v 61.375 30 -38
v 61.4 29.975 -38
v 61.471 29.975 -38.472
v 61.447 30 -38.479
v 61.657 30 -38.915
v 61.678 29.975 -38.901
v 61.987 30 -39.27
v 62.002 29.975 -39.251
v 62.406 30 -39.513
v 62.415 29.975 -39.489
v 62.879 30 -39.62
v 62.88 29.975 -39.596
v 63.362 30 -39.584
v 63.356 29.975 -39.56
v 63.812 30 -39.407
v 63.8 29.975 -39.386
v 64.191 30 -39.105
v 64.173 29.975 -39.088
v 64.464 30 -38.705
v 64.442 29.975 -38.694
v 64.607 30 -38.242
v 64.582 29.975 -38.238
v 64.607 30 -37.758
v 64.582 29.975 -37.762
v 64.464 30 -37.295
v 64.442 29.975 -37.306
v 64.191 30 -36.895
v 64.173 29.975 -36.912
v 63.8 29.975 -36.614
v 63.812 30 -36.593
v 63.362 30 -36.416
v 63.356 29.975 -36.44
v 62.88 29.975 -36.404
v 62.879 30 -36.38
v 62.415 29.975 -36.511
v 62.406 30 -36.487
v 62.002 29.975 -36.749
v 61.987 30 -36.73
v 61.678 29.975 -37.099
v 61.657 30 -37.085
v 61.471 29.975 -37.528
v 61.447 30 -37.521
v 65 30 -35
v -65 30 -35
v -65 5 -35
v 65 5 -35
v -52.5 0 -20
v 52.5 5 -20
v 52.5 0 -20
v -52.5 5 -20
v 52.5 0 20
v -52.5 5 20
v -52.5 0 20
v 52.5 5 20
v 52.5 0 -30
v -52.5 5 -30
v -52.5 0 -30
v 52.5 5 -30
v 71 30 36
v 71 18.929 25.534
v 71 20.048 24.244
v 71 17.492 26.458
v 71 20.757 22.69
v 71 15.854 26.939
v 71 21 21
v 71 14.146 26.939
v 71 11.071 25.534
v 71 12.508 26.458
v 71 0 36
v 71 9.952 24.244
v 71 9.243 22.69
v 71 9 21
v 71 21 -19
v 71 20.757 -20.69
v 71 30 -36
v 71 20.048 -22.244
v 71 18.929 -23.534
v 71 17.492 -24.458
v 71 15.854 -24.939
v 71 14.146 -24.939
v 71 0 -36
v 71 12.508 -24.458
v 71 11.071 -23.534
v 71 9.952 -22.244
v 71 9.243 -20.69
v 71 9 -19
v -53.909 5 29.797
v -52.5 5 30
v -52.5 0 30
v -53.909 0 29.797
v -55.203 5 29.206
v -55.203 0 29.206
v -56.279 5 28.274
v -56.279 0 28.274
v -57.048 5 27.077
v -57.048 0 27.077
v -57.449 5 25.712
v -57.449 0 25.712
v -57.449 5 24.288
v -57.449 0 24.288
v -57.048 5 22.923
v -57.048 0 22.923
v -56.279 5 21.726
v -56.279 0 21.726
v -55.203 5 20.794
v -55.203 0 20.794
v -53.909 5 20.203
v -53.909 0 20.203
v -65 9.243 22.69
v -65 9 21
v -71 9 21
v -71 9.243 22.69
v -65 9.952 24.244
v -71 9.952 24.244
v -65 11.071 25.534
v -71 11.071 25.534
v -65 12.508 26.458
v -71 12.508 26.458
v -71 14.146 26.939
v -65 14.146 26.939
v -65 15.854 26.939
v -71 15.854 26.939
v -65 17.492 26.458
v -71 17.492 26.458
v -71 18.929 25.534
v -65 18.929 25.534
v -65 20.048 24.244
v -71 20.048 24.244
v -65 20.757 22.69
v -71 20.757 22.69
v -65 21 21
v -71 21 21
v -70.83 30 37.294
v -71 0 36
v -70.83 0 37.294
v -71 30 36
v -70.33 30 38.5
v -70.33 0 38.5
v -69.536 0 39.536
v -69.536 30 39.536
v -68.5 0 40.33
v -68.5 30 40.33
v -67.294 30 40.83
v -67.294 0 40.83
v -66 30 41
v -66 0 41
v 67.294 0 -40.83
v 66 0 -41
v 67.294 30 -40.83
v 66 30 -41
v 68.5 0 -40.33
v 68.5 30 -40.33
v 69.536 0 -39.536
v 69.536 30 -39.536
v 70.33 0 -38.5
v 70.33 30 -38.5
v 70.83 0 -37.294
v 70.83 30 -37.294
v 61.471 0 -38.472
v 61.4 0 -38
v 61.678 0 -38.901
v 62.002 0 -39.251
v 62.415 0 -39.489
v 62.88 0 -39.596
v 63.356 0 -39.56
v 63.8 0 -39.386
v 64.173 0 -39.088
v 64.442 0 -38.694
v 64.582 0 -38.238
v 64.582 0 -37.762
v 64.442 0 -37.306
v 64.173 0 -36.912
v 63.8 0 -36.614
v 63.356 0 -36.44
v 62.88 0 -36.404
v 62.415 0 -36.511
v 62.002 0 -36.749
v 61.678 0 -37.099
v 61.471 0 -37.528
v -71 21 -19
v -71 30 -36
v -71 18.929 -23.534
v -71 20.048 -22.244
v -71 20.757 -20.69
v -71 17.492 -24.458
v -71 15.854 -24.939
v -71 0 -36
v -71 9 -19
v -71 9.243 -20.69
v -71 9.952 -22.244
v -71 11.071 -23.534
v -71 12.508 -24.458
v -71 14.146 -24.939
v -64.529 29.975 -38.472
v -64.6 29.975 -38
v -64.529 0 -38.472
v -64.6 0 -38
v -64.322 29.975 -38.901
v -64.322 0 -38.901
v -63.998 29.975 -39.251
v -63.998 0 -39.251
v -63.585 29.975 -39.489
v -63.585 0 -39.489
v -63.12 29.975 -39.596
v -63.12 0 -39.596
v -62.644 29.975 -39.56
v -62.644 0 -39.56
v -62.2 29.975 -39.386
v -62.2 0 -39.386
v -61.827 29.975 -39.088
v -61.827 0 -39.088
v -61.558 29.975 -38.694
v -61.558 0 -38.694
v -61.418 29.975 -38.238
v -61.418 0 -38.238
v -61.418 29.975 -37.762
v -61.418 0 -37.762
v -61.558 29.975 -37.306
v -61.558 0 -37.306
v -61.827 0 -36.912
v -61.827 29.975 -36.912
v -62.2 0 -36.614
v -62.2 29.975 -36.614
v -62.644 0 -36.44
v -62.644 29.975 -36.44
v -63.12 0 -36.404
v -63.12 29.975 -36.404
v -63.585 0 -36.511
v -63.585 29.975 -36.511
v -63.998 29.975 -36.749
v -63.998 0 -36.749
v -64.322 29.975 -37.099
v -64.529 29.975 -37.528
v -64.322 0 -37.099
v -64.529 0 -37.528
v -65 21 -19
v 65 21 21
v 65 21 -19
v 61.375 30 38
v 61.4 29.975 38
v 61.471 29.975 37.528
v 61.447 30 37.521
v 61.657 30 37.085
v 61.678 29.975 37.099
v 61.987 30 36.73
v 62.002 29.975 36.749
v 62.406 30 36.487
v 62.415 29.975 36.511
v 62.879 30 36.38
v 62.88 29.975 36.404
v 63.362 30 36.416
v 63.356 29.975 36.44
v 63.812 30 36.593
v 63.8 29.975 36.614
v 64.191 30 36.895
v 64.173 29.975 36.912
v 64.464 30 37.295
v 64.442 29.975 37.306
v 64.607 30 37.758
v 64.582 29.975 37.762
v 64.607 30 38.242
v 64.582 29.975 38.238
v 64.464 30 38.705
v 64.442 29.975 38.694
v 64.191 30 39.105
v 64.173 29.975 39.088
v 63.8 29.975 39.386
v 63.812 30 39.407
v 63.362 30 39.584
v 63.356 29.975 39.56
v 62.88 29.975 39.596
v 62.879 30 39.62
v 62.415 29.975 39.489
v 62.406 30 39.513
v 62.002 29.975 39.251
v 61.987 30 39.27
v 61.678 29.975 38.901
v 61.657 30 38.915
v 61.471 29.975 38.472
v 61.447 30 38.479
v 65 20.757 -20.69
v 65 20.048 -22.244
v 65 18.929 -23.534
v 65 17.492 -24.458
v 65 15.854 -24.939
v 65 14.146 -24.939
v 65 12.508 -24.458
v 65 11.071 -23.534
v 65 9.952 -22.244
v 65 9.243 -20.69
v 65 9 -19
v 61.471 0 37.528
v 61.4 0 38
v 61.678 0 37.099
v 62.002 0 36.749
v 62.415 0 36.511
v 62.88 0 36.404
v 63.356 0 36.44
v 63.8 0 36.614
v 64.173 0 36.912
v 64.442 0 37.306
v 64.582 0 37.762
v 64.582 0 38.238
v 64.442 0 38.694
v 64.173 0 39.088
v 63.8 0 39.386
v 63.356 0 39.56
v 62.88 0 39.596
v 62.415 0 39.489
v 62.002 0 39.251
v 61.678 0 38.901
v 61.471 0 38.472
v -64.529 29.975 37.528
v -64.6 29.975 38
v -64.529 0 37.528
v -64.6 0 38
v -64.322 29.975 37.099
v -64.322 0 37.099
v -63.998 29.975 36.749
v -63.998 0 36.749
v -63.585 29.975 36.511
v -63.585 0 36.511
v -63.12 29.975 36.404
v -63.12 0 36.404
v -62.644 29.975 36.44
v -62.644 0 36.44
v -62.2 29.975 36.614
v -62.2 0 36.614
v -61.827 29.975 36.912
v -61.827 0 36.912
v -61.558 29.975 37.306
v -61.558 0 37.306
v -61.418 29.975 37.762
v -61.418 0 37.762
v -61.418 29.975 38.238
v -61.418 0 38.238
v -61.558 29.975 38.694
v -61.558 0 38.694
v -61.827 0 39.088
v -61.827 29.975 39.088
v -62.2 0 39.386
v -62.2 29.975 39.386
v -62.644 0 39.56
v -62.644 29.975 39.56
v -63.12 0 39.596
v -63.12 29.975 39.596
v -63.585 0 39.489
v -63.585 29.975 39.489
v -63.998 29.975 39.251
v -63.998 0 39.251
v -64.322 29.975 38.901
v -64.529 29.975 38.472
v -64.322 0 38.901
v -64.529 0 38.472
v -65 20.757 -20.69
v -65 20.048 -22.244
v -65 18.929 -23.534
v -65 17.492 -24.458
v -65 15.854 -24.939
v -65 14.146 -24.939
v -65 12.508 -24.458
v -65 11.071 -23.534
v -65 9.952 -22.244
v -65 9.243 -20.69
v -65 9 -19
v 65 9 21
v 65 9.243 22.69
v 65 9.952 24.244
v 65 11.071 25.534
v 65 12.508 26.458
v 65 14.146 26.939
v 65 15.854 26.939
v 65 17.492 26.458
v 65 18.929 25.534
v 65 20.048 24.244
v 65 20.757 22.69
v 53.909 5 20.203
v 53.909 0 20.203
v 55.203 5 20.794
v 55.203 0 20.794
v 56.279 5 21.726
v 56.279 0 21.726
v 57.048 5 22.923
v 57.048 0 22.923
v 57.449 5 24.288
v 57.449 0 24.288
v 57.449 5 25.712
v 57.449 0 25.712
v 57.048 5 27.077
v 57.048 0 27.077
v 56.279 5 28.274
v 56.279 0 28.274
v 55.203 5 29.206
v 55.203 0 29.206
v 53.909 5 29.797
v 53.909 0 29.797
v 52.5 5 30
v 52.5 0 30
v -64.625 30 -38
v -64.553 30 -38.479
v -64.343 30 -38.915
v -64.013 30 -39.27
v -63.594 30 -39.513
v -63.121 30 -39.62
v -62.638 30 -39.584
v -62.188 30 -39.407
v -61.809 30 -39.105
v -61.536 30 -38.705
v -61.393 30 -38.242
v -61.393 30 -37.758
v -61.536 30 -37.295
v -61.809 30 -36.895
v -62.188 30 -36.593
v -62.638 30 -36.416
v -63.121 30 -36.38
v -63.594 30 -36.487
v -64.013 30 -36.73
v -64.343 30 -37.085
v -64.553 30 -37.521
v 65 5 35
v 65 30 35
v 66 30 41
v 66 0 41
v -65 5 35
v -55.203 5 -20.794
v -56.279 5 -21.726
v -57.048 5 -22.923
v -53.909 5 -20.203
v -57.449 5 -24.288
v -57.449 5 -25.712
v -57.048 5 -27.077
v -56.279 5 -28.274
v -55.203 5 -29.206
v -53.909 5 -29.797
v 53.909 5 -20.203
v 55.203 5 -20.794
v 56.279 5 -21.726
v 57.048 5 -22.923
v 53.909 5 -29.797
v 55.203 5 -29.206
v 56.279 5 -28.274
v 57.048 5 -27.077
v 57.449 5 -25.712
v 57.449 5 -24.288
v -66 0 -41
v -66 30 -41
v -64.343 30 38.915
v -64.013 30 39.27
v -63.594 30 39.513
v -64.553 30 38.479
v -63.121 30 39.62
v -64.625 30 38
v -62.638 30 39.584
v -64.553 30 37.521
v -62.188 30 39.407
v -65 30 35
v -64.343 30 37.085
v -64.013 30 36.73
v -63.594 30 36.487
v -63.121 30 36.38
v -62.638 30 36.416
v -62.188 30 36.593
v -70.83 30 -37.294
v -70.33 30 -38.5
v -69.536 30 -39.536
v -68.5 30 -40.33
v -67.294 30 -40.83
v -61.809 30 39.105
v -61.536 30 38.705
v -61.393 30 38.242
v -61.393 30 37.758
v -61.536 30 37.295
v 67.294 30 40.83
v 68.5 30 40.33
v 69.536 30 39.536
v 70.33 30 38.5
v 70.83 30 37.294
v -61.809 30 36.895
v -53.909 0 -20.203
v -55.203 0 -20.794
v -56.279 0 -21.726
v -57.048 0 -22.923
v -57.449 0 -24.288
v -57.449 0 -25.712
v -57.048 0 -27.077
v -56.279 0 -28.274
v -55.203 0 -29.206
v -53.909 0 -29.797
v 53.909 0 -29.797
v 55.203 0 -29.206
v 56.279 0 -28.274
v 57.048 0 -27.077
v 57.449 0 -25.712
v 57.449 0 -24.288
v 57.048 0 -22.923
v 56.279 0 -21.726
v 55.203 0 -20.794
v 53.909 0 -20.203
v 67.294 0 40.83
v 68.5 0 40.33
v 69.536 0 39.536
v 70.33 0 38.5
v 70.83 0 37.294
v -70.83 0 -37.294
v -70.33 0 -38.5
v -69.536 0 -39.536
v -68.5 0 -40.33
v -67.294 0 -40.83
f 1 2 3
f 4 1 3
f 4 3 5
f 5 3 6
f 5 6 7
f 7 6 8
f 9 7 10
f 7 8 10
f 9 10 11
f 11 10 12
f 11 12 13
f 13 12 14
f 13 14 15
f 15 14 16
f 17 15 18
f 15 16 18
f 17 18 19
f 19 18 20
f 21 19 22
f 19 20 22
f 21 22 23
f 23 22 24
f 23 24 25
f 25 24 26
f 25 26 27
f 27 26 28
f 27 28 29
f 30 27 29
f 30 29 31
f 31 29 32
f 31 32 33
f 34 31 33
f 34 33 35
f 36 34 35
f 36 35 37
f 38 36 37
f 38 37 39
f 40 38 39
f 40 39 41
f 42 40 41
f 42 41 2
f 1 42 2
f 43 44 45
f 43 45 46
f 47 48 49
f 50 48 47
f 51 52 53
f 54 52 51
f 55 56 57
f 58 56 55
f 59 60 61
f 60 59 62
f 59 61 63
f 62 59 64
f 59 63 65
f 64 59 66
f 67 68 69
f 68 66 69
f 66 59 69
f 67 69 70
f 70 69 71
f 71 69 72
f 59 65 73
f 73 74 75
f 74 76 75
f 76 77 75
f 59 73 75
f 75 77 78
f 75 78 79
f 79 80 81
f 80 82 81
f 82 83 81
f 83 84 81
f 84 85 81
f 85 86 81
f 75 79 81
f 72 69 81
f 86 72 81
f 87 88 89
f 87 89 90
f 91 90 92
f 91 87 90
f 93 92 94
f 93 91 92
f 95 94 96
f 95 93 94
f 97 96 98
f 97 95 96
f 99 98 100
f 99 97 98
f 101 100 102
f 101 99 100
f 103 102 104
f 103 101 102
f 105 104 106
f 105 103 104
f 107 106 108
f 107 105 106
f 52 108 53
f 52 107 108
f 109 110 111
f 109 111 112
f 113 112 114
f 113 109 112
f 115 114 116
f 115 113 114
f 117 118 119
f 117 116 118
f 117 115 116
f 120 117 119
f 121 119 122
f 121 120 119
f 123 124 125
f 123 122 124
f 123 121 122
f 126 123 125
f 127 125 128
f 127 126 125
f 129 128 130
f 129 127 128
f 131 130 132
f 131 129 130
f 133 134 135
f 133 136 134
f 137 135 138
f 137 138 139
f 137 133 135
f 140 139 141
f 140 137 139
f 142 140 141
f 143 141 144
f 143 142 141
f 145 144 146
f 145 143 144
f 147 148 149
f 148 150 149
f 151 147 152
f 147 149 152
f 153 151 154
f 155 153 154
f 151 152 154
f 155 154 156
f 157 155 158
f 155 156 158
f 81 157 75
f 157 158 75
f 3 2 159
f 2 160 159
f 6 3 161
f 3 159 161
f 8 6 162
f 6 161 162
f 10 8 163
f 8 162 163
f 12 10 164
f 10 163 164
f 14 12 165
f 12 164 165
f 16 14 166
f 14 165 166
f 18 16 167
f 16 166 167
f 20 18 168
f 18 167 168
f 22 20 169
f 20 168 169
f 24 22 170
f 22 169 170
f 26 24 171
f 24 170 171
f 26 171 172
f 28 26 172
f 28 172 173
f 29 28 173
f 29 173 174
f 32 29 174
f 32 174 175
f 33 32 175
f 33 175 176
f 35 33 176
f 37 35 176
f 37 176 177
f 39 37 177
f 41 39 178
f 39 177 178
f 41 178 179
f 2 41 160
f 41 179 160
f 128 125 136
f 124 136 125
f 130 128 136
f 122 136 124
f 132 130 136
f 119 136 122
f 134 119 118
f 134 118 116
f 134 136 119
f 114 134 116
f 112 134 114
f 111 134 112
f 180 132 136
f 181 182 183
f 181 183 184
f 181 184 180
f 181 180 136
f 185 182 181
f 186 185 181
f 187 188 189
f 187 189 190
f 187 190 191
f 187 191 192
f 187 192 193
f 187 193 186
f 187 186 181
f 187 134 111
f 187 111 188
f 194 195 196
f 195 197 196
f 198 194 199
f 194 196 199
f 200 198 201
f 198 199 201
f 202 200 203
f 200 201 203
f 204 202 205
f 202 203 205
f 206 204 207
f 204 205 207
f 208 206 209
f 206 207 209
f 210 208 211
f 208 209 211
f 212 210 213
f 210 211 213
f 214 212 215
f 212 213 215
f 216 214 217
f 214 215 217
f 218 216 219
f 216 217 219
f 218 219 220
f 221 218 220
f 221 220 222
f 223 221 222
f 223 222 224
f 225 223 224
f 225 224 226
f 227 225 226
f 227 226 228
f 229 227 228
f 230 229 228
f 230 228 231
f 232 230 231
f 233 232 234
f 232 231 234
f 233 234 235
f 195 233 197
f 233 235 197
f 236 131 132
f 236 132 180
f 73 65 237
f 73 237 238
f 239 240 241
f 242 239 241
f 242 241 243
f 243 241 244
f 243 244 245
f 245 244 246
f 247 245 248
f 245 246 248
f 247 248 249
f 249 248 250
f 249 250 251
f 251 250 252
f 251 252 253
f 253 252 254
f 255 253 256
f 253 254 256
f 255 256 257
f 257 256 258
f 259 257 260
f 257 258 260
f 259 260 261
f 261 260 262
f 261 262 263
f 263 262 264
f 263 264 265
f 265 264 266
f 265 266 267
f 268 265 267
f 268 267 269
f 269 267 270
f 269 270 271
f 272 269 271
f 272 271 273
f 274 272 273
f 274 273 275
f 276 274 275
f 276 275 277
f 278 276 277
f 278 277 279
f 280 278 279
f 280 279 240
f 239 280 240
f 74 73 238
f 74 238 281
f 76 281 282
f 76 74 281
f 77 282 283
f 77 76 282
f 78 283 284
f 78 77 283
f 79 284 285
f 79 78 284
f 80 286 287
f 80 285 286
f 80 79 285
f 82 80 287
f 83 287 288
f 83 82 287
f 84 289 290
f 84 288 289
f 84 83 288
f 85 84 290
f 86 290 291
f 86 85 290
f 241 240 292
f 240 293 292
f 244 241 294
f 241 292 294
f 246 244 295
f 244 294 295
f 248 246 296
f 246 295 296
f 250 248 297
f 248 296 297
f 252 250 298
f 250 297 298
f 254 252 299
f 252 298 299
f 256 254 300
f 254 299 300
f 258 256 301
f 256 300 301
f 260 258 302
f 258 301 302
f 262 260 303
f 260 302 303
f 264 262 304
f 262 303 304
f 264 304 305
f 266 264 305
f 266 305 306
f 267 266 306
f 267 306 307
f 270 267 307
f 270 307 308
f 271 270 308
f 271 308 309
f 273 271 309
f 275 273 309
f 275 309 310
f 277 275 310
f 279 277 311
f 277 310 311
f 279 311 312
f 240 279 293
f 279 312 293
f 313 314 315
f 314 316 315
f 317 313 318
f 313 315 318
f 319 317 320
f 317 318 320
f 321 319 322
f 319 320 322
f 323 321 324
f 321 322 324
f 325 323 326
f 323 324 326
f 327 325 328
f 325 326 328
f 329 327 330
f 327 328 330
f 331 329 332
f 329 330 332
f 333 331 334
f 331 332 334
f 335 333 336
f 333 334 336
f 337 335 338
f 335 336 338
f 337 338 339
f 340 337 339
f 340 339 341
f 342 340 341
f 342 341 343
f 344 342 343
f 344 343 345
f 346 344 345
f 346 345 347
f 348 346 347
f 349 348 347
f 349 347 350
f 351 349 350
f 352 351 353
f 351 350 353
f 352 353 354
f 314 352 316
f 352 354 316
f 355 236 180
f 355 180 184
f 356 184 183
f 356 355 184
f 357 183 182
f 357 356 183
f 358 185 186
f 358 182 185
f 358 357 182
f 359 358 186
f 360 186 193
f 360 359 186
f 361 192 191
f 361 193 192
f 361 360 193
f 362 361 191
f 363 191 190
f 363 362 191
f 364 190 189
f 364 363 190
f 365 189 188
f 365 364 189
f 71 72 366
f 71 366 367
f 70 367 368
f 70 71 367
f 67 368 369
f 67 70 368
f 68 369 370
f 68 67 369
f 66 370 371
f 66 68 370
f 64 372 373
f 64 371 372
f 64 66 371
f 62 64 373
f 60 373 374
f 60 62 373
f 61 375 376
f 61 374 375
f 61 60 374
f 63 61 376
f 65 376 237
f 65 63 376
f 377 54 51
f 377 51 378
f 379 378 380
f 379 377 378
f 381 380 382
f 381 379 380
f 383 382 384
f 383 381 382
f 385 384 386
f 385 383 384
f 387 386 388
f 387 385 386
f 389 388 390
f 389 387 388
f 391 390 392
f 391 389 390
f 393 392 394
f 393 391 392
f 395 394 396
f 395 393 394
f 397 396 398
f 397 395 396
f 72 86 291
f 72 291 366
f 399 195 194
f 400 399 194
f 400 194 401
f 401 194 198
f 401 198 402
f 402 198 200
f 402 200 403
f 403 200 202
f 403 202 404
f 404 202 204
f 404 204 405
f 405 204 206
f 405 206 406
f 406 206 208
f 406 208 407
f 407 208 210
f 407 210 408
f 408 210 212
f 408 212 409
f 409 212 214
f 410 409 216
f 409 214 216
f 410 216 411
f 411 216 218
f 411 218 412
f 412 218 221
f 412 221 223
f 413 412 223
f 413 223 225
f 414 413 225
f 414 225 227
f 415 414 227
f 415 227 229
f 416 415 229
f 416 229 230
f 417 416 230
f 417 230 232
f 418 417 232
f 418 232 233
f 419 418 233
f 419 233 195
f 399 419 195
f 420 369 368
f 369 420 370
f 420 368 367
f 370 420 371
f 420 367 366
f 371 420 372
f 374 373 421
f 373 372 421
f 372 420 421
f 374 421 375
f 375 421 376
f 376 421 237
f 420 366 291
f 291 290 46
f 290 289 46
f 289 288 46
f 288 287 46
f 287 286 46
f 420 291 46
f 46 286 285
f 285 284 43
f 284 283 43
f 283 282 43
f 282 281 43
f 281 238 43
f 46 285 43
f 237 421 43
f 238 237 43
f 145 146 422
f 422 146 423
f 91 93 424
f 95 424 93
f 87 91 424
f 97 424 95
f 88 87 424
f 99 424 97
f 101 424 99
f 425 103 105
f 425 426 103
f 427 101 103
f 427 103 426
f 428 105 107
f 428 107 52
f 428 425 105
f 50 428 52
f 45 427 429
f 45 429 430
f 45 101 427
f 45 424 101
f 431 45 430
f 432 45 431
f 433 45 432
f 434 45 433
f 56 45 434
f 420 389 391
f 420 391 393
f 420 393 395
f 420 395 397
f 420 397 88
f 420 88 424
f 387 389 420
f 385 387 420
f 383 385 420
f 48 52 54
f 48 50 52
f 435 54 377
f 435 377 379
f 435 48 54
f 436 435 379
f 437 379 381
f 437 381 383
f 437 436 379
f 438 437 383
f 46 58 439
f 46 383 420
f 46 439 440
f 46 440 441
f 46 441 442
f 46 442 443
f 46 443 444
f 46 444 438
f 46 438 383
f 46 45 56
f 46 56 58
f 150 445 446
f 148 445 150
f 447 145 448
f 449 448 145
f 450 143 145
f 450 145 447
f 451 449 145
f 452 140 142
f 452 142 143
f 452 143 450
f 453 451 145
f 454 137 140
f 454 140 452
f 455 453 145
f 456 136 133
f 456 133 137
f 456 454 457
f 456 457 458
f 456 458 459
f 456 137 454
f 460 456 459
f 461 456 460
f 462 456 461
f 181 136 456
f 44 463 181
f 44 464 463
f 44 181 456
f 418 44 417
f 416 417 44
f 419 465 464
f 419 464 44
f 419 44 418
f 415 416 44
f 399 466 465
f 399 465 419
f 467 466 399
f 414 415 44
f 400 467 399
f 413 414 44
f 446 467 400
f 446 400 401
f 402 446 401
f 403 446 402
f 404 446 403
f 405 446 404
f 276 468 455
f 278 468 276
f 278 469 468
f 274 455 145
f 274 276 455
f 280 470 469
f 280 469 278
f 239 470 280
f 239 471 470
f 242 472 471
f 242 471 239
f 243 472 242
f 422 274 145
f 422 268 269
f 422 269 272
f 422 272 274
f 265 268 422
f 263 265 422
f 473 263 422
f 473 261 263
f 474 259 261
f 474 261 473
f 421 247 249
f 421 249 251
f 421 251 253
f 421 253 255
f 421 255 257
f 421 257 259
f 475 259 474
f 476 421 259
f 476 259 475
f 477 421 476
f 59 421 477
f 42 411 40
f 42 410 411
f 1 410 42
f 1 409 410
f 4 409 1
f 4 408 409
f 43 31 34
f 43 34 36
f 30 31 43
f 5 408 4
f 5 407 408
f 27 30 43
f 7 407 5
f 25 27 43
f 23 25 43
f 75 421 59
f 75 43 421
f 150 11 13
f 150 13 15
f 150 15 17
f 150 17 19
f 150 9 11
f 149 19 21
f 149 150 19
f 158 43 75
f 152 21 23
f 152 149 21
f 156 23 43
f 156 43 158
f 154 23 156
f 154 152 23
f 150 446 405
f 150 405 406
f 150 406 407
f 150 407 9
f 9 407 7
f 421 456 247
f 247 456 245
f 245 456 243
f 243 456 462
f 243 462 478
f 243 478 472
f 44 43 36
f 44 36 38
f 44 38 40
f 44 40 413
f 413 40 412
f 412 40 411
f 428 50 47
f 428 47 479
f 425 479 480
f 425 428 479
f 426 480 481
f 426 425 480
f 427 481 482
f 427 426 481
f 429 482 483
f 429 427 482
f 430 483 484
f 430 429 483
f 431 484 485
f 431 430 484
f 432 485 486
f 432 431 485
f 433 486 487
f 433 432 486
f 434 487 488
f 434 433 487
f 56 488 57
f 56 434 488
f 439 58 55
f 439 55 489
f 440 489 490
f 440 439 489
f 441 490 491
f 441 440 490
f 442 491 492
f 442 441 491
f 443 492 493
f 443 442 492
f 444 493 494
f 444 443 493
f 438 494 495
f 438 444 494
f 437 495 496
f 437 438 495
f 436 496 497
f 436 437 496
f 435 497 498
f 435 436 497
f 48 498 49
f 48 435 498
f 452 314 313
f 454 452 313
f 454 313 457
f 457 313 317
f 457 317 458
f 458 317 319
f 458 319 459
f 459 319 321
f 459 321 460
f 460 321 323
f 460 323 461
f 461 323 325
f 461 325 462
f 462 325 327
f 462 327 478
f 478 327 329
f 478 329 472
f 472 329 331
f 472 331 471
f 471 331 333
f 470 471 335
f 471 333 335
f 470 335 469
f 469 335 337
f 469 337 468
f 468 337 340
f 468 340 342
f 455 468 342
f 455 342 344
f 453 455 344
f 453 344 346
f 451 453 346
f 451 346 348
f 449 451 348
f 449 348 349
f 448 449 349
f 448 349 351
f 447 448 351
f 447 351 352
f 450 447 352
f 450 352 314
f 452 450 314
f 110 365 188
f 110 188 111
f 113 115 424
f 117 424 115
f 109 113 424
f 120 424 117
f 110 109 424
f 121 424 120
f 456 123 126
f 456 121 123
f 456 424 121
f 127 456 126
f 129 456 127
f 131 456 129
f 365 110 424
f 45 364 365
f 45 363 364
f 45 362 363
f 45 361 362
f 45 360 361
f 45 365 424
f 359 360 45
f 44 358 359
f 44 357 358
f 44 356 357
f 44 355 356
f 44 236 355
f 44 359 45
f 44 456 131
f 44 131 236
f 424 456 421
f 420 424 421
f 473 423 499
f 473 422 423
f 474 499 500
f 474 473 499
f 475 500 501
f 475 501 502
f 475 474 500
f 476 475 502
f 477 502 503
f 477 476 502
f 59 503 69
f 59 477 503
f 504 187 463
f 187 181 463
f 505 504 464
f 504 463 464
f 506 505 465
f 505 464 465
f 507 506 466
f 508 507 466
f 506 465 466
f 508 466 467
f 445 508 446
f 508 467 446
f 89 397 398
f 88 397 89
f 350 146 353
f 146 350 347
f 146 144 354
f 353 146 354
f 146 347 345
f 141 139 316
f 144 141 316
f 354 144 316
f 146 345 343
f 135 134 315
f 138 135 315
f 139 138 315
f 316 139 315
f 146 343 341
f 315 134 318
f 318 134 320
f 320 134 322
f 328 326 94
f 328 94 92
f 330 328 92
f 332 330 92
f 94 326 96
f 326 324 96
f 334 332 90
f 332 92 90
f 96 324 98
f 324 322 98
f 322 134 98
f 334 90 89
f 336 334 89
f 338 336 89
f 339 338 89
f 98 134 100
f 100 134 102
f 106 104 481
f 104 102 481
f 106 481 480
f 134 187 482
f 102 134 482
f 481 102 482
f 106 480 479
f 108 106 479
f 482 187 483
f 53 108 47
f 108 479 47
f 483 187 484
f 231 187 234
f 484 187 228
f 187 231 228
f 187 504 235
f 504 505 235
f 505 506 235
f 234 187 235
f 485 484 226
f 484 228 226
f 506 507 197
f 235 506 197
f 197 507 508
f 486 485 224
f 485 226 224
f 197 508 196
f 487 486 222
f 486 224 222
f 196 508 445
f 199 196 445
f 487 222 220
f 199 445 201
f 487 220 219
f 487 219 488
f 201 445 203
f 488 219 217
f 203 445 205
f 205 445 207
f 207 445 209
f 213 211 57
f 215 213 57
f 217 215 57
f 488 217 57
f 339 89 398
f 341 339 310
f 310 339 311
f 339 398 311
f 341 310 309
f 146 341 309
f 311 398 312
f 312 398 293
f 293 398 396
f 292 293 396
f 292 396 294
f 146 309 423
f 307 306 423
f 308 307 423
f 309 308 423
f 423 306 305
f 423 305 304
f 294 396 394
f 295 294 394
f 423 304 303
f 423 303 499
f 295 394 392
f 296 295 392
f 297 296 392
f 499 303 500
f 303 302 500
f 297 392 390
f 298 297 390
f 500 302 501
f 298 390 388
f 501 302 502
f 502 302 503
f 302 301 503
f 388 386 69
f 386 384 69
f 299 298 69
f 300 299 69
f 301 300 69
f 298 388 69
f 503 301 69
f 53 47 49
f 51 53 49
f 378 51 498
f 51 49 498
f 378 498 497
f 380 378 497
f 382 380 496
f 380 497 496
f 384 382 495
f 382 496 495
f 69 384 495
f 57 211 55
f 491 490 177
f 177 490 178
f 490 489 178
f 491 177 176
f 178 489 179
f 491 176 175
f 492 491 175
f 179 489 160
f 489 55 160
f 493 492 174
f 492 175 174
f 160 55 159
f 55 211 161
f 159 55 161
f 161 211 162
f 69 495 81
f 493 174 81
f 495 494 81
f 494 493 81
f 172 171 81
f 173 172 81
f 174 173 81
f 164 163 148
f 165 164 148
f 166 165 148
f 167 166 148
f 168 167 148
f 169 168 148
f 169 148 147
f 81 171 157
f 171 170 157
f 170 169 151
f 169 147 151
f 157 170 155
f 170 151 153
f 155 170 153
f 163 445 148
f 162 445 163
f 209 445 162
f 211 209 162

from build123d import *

# Parameters (mm, degrees)
SKETCH1_W                      = 142
SKETCH1_H                      = 82
BOSS_EXTRUDE1_DEPTH            = 30
SKETCH3_W                      = 130
SKETCH3_H                      = 70
CUT_EXTRUDE1_DEPTH             = 25
FILLET1_R                      = 5
M3_CLEARANCE_HOLE1_D           = 3.2
M3_CLEARANCE_HOLE1_CSINK_D     = 3.25
M3_CLEARANCE_HOLE1_CSINK_ANGLE = 90
CUT_EXTRUDE2_REACH             = 7
CUT_EXTRUDE3_DEPTH             = 143


with BuildPart() as part:
    # Sketch1 → Boss-Extrude1 (new body)
    with BuildSketch(Plane(origin=(0, 0, 0), x_dir=(1, 0, 0), z_dir=(0, 1, 0))):
        Rectangle(SKETCH1_W, SKETCH1_H)
    extrude(amount=BOSS_EXTRUDE1_DEPTH)

    # Sketch3 → Cut-Extrude1 (cut)
    with BuildSketch(Plane(origin=(0, 30, 0), x_dir=(1, 0, 0), z_dir=(0, 1, 0))):
        Rectangle(SKETCH3_W, SKETCH3_H)
    extrude(amount=-CUT_EXTRUDE1_DEPTH, mode=Mode.SUBTRACT)

    # Fillet1
    fillet1_edges = [part.edges().sort_by_distance(p)[0] for p in [
        (71, 15, 41),
        (-71, 15, 41),
        (-71, 15, -41),
        (71, 15, -41),
    ]]
    fillet(fillet1_edges, radius=FILLET1_R)

    # M3 Clearance Hole1 (through all)
    with Locations(Plane(origin=(0, 30, 0), x_dir=(1, 0, 0), z_dir=(0, 1, 0))):
        with Locations((63, -38), (63, 38), (-63, 38), (-63, -38)):
            CounterSinkHole(M3_CLEARANCE_HOLE1_D / 2, M3_CLEARANCE_HOLE1_CSINK_D / 2, counter_sink_angle=M3_CLEARANCE_HOLE1_CSINK_ANGLE)

    # Sketch6 → Cut-Extrude2 (cut, up to next)
    with BuildSketch(Plane(origin=(0, 5, 0), x_dir=(1, 0, 0), z_dir=(0, 1, 0)), mode=Mode.PRIVATE) as cut_extrude2_sk1:
        with BuildLine():
            Line((52.5, -30), (-52.5, -30))
            ThreePointArc((-52.5, -30), (-57.5, -25), (-52.5, -20))
            Line((-52.5, -20), (52.5, -20))
            ThreePointArc((52.5, -20), (57.5, -25), (52.5, -30))
        make_face()
    cut_extrude2_tool1 = extrude(cut_extrude2_sk1.sketch, amount=-CUT_EXTRUDE2_REACH, mode=Mode.PRIVATE) & part.part
    add(cut_extrude2_tool1.solids().sort_by_distance((0, 5, 25))[0], mode=Mode.SUBTRACT)
    # Sketch6 → Cut-Extrude2 (cut, up to next)
    with BuildSketch(Plane(origin=(0, 5, 0), x_dir=(1, 0, 0), z_dir=(0, 1, 0)), mode=Mode.PRIVATE) as cut_extrude2_sk2:
        with BuildLine():
            Line((52.5, 20), (-52.5, 20))
            ThreePointArc((-52.5, 20), (-57.5, 25), (-52.5, 30))
            Line((-52.5, 30), (52.5, 30))
            ThreePointArc((52.5, 30), (57.5, 25), (52.5, 20))
        make_face()
    cut_extrude2_tool2 = extrude(cut_extrude2_sk2.sketch, amount=-CUT_EXTRUDE2_REACH, mode=Mode.PRIVATE) & part.part
    add(cut_extrude2_tool2.solids().sort_by_distance((0, 5, -25))[0], mode=Mode.SUBTRACT)

    # Sketch7 → Cut-Extrude3 (cut, through all)
    with BuildSketch(Plane(origin=(71, 0, 0), x_dir=(0, 0, -1), z_dir=(1, 0, 0))):
        with BuildLine():
            Line((-21, 21), (19, 21))
            ThreePointArc((19, 21), (25, 15), (19, 9))
            Line((19, 9), (-21, 9))
            ThreePointArc((-21, 9), (-27, 15), (-21, 21))
        make_face()
    extrude(amount=-CUT_EXTRUDE3_DEPTH, mode=Mode.SUBTRACT)


solid = part.part
